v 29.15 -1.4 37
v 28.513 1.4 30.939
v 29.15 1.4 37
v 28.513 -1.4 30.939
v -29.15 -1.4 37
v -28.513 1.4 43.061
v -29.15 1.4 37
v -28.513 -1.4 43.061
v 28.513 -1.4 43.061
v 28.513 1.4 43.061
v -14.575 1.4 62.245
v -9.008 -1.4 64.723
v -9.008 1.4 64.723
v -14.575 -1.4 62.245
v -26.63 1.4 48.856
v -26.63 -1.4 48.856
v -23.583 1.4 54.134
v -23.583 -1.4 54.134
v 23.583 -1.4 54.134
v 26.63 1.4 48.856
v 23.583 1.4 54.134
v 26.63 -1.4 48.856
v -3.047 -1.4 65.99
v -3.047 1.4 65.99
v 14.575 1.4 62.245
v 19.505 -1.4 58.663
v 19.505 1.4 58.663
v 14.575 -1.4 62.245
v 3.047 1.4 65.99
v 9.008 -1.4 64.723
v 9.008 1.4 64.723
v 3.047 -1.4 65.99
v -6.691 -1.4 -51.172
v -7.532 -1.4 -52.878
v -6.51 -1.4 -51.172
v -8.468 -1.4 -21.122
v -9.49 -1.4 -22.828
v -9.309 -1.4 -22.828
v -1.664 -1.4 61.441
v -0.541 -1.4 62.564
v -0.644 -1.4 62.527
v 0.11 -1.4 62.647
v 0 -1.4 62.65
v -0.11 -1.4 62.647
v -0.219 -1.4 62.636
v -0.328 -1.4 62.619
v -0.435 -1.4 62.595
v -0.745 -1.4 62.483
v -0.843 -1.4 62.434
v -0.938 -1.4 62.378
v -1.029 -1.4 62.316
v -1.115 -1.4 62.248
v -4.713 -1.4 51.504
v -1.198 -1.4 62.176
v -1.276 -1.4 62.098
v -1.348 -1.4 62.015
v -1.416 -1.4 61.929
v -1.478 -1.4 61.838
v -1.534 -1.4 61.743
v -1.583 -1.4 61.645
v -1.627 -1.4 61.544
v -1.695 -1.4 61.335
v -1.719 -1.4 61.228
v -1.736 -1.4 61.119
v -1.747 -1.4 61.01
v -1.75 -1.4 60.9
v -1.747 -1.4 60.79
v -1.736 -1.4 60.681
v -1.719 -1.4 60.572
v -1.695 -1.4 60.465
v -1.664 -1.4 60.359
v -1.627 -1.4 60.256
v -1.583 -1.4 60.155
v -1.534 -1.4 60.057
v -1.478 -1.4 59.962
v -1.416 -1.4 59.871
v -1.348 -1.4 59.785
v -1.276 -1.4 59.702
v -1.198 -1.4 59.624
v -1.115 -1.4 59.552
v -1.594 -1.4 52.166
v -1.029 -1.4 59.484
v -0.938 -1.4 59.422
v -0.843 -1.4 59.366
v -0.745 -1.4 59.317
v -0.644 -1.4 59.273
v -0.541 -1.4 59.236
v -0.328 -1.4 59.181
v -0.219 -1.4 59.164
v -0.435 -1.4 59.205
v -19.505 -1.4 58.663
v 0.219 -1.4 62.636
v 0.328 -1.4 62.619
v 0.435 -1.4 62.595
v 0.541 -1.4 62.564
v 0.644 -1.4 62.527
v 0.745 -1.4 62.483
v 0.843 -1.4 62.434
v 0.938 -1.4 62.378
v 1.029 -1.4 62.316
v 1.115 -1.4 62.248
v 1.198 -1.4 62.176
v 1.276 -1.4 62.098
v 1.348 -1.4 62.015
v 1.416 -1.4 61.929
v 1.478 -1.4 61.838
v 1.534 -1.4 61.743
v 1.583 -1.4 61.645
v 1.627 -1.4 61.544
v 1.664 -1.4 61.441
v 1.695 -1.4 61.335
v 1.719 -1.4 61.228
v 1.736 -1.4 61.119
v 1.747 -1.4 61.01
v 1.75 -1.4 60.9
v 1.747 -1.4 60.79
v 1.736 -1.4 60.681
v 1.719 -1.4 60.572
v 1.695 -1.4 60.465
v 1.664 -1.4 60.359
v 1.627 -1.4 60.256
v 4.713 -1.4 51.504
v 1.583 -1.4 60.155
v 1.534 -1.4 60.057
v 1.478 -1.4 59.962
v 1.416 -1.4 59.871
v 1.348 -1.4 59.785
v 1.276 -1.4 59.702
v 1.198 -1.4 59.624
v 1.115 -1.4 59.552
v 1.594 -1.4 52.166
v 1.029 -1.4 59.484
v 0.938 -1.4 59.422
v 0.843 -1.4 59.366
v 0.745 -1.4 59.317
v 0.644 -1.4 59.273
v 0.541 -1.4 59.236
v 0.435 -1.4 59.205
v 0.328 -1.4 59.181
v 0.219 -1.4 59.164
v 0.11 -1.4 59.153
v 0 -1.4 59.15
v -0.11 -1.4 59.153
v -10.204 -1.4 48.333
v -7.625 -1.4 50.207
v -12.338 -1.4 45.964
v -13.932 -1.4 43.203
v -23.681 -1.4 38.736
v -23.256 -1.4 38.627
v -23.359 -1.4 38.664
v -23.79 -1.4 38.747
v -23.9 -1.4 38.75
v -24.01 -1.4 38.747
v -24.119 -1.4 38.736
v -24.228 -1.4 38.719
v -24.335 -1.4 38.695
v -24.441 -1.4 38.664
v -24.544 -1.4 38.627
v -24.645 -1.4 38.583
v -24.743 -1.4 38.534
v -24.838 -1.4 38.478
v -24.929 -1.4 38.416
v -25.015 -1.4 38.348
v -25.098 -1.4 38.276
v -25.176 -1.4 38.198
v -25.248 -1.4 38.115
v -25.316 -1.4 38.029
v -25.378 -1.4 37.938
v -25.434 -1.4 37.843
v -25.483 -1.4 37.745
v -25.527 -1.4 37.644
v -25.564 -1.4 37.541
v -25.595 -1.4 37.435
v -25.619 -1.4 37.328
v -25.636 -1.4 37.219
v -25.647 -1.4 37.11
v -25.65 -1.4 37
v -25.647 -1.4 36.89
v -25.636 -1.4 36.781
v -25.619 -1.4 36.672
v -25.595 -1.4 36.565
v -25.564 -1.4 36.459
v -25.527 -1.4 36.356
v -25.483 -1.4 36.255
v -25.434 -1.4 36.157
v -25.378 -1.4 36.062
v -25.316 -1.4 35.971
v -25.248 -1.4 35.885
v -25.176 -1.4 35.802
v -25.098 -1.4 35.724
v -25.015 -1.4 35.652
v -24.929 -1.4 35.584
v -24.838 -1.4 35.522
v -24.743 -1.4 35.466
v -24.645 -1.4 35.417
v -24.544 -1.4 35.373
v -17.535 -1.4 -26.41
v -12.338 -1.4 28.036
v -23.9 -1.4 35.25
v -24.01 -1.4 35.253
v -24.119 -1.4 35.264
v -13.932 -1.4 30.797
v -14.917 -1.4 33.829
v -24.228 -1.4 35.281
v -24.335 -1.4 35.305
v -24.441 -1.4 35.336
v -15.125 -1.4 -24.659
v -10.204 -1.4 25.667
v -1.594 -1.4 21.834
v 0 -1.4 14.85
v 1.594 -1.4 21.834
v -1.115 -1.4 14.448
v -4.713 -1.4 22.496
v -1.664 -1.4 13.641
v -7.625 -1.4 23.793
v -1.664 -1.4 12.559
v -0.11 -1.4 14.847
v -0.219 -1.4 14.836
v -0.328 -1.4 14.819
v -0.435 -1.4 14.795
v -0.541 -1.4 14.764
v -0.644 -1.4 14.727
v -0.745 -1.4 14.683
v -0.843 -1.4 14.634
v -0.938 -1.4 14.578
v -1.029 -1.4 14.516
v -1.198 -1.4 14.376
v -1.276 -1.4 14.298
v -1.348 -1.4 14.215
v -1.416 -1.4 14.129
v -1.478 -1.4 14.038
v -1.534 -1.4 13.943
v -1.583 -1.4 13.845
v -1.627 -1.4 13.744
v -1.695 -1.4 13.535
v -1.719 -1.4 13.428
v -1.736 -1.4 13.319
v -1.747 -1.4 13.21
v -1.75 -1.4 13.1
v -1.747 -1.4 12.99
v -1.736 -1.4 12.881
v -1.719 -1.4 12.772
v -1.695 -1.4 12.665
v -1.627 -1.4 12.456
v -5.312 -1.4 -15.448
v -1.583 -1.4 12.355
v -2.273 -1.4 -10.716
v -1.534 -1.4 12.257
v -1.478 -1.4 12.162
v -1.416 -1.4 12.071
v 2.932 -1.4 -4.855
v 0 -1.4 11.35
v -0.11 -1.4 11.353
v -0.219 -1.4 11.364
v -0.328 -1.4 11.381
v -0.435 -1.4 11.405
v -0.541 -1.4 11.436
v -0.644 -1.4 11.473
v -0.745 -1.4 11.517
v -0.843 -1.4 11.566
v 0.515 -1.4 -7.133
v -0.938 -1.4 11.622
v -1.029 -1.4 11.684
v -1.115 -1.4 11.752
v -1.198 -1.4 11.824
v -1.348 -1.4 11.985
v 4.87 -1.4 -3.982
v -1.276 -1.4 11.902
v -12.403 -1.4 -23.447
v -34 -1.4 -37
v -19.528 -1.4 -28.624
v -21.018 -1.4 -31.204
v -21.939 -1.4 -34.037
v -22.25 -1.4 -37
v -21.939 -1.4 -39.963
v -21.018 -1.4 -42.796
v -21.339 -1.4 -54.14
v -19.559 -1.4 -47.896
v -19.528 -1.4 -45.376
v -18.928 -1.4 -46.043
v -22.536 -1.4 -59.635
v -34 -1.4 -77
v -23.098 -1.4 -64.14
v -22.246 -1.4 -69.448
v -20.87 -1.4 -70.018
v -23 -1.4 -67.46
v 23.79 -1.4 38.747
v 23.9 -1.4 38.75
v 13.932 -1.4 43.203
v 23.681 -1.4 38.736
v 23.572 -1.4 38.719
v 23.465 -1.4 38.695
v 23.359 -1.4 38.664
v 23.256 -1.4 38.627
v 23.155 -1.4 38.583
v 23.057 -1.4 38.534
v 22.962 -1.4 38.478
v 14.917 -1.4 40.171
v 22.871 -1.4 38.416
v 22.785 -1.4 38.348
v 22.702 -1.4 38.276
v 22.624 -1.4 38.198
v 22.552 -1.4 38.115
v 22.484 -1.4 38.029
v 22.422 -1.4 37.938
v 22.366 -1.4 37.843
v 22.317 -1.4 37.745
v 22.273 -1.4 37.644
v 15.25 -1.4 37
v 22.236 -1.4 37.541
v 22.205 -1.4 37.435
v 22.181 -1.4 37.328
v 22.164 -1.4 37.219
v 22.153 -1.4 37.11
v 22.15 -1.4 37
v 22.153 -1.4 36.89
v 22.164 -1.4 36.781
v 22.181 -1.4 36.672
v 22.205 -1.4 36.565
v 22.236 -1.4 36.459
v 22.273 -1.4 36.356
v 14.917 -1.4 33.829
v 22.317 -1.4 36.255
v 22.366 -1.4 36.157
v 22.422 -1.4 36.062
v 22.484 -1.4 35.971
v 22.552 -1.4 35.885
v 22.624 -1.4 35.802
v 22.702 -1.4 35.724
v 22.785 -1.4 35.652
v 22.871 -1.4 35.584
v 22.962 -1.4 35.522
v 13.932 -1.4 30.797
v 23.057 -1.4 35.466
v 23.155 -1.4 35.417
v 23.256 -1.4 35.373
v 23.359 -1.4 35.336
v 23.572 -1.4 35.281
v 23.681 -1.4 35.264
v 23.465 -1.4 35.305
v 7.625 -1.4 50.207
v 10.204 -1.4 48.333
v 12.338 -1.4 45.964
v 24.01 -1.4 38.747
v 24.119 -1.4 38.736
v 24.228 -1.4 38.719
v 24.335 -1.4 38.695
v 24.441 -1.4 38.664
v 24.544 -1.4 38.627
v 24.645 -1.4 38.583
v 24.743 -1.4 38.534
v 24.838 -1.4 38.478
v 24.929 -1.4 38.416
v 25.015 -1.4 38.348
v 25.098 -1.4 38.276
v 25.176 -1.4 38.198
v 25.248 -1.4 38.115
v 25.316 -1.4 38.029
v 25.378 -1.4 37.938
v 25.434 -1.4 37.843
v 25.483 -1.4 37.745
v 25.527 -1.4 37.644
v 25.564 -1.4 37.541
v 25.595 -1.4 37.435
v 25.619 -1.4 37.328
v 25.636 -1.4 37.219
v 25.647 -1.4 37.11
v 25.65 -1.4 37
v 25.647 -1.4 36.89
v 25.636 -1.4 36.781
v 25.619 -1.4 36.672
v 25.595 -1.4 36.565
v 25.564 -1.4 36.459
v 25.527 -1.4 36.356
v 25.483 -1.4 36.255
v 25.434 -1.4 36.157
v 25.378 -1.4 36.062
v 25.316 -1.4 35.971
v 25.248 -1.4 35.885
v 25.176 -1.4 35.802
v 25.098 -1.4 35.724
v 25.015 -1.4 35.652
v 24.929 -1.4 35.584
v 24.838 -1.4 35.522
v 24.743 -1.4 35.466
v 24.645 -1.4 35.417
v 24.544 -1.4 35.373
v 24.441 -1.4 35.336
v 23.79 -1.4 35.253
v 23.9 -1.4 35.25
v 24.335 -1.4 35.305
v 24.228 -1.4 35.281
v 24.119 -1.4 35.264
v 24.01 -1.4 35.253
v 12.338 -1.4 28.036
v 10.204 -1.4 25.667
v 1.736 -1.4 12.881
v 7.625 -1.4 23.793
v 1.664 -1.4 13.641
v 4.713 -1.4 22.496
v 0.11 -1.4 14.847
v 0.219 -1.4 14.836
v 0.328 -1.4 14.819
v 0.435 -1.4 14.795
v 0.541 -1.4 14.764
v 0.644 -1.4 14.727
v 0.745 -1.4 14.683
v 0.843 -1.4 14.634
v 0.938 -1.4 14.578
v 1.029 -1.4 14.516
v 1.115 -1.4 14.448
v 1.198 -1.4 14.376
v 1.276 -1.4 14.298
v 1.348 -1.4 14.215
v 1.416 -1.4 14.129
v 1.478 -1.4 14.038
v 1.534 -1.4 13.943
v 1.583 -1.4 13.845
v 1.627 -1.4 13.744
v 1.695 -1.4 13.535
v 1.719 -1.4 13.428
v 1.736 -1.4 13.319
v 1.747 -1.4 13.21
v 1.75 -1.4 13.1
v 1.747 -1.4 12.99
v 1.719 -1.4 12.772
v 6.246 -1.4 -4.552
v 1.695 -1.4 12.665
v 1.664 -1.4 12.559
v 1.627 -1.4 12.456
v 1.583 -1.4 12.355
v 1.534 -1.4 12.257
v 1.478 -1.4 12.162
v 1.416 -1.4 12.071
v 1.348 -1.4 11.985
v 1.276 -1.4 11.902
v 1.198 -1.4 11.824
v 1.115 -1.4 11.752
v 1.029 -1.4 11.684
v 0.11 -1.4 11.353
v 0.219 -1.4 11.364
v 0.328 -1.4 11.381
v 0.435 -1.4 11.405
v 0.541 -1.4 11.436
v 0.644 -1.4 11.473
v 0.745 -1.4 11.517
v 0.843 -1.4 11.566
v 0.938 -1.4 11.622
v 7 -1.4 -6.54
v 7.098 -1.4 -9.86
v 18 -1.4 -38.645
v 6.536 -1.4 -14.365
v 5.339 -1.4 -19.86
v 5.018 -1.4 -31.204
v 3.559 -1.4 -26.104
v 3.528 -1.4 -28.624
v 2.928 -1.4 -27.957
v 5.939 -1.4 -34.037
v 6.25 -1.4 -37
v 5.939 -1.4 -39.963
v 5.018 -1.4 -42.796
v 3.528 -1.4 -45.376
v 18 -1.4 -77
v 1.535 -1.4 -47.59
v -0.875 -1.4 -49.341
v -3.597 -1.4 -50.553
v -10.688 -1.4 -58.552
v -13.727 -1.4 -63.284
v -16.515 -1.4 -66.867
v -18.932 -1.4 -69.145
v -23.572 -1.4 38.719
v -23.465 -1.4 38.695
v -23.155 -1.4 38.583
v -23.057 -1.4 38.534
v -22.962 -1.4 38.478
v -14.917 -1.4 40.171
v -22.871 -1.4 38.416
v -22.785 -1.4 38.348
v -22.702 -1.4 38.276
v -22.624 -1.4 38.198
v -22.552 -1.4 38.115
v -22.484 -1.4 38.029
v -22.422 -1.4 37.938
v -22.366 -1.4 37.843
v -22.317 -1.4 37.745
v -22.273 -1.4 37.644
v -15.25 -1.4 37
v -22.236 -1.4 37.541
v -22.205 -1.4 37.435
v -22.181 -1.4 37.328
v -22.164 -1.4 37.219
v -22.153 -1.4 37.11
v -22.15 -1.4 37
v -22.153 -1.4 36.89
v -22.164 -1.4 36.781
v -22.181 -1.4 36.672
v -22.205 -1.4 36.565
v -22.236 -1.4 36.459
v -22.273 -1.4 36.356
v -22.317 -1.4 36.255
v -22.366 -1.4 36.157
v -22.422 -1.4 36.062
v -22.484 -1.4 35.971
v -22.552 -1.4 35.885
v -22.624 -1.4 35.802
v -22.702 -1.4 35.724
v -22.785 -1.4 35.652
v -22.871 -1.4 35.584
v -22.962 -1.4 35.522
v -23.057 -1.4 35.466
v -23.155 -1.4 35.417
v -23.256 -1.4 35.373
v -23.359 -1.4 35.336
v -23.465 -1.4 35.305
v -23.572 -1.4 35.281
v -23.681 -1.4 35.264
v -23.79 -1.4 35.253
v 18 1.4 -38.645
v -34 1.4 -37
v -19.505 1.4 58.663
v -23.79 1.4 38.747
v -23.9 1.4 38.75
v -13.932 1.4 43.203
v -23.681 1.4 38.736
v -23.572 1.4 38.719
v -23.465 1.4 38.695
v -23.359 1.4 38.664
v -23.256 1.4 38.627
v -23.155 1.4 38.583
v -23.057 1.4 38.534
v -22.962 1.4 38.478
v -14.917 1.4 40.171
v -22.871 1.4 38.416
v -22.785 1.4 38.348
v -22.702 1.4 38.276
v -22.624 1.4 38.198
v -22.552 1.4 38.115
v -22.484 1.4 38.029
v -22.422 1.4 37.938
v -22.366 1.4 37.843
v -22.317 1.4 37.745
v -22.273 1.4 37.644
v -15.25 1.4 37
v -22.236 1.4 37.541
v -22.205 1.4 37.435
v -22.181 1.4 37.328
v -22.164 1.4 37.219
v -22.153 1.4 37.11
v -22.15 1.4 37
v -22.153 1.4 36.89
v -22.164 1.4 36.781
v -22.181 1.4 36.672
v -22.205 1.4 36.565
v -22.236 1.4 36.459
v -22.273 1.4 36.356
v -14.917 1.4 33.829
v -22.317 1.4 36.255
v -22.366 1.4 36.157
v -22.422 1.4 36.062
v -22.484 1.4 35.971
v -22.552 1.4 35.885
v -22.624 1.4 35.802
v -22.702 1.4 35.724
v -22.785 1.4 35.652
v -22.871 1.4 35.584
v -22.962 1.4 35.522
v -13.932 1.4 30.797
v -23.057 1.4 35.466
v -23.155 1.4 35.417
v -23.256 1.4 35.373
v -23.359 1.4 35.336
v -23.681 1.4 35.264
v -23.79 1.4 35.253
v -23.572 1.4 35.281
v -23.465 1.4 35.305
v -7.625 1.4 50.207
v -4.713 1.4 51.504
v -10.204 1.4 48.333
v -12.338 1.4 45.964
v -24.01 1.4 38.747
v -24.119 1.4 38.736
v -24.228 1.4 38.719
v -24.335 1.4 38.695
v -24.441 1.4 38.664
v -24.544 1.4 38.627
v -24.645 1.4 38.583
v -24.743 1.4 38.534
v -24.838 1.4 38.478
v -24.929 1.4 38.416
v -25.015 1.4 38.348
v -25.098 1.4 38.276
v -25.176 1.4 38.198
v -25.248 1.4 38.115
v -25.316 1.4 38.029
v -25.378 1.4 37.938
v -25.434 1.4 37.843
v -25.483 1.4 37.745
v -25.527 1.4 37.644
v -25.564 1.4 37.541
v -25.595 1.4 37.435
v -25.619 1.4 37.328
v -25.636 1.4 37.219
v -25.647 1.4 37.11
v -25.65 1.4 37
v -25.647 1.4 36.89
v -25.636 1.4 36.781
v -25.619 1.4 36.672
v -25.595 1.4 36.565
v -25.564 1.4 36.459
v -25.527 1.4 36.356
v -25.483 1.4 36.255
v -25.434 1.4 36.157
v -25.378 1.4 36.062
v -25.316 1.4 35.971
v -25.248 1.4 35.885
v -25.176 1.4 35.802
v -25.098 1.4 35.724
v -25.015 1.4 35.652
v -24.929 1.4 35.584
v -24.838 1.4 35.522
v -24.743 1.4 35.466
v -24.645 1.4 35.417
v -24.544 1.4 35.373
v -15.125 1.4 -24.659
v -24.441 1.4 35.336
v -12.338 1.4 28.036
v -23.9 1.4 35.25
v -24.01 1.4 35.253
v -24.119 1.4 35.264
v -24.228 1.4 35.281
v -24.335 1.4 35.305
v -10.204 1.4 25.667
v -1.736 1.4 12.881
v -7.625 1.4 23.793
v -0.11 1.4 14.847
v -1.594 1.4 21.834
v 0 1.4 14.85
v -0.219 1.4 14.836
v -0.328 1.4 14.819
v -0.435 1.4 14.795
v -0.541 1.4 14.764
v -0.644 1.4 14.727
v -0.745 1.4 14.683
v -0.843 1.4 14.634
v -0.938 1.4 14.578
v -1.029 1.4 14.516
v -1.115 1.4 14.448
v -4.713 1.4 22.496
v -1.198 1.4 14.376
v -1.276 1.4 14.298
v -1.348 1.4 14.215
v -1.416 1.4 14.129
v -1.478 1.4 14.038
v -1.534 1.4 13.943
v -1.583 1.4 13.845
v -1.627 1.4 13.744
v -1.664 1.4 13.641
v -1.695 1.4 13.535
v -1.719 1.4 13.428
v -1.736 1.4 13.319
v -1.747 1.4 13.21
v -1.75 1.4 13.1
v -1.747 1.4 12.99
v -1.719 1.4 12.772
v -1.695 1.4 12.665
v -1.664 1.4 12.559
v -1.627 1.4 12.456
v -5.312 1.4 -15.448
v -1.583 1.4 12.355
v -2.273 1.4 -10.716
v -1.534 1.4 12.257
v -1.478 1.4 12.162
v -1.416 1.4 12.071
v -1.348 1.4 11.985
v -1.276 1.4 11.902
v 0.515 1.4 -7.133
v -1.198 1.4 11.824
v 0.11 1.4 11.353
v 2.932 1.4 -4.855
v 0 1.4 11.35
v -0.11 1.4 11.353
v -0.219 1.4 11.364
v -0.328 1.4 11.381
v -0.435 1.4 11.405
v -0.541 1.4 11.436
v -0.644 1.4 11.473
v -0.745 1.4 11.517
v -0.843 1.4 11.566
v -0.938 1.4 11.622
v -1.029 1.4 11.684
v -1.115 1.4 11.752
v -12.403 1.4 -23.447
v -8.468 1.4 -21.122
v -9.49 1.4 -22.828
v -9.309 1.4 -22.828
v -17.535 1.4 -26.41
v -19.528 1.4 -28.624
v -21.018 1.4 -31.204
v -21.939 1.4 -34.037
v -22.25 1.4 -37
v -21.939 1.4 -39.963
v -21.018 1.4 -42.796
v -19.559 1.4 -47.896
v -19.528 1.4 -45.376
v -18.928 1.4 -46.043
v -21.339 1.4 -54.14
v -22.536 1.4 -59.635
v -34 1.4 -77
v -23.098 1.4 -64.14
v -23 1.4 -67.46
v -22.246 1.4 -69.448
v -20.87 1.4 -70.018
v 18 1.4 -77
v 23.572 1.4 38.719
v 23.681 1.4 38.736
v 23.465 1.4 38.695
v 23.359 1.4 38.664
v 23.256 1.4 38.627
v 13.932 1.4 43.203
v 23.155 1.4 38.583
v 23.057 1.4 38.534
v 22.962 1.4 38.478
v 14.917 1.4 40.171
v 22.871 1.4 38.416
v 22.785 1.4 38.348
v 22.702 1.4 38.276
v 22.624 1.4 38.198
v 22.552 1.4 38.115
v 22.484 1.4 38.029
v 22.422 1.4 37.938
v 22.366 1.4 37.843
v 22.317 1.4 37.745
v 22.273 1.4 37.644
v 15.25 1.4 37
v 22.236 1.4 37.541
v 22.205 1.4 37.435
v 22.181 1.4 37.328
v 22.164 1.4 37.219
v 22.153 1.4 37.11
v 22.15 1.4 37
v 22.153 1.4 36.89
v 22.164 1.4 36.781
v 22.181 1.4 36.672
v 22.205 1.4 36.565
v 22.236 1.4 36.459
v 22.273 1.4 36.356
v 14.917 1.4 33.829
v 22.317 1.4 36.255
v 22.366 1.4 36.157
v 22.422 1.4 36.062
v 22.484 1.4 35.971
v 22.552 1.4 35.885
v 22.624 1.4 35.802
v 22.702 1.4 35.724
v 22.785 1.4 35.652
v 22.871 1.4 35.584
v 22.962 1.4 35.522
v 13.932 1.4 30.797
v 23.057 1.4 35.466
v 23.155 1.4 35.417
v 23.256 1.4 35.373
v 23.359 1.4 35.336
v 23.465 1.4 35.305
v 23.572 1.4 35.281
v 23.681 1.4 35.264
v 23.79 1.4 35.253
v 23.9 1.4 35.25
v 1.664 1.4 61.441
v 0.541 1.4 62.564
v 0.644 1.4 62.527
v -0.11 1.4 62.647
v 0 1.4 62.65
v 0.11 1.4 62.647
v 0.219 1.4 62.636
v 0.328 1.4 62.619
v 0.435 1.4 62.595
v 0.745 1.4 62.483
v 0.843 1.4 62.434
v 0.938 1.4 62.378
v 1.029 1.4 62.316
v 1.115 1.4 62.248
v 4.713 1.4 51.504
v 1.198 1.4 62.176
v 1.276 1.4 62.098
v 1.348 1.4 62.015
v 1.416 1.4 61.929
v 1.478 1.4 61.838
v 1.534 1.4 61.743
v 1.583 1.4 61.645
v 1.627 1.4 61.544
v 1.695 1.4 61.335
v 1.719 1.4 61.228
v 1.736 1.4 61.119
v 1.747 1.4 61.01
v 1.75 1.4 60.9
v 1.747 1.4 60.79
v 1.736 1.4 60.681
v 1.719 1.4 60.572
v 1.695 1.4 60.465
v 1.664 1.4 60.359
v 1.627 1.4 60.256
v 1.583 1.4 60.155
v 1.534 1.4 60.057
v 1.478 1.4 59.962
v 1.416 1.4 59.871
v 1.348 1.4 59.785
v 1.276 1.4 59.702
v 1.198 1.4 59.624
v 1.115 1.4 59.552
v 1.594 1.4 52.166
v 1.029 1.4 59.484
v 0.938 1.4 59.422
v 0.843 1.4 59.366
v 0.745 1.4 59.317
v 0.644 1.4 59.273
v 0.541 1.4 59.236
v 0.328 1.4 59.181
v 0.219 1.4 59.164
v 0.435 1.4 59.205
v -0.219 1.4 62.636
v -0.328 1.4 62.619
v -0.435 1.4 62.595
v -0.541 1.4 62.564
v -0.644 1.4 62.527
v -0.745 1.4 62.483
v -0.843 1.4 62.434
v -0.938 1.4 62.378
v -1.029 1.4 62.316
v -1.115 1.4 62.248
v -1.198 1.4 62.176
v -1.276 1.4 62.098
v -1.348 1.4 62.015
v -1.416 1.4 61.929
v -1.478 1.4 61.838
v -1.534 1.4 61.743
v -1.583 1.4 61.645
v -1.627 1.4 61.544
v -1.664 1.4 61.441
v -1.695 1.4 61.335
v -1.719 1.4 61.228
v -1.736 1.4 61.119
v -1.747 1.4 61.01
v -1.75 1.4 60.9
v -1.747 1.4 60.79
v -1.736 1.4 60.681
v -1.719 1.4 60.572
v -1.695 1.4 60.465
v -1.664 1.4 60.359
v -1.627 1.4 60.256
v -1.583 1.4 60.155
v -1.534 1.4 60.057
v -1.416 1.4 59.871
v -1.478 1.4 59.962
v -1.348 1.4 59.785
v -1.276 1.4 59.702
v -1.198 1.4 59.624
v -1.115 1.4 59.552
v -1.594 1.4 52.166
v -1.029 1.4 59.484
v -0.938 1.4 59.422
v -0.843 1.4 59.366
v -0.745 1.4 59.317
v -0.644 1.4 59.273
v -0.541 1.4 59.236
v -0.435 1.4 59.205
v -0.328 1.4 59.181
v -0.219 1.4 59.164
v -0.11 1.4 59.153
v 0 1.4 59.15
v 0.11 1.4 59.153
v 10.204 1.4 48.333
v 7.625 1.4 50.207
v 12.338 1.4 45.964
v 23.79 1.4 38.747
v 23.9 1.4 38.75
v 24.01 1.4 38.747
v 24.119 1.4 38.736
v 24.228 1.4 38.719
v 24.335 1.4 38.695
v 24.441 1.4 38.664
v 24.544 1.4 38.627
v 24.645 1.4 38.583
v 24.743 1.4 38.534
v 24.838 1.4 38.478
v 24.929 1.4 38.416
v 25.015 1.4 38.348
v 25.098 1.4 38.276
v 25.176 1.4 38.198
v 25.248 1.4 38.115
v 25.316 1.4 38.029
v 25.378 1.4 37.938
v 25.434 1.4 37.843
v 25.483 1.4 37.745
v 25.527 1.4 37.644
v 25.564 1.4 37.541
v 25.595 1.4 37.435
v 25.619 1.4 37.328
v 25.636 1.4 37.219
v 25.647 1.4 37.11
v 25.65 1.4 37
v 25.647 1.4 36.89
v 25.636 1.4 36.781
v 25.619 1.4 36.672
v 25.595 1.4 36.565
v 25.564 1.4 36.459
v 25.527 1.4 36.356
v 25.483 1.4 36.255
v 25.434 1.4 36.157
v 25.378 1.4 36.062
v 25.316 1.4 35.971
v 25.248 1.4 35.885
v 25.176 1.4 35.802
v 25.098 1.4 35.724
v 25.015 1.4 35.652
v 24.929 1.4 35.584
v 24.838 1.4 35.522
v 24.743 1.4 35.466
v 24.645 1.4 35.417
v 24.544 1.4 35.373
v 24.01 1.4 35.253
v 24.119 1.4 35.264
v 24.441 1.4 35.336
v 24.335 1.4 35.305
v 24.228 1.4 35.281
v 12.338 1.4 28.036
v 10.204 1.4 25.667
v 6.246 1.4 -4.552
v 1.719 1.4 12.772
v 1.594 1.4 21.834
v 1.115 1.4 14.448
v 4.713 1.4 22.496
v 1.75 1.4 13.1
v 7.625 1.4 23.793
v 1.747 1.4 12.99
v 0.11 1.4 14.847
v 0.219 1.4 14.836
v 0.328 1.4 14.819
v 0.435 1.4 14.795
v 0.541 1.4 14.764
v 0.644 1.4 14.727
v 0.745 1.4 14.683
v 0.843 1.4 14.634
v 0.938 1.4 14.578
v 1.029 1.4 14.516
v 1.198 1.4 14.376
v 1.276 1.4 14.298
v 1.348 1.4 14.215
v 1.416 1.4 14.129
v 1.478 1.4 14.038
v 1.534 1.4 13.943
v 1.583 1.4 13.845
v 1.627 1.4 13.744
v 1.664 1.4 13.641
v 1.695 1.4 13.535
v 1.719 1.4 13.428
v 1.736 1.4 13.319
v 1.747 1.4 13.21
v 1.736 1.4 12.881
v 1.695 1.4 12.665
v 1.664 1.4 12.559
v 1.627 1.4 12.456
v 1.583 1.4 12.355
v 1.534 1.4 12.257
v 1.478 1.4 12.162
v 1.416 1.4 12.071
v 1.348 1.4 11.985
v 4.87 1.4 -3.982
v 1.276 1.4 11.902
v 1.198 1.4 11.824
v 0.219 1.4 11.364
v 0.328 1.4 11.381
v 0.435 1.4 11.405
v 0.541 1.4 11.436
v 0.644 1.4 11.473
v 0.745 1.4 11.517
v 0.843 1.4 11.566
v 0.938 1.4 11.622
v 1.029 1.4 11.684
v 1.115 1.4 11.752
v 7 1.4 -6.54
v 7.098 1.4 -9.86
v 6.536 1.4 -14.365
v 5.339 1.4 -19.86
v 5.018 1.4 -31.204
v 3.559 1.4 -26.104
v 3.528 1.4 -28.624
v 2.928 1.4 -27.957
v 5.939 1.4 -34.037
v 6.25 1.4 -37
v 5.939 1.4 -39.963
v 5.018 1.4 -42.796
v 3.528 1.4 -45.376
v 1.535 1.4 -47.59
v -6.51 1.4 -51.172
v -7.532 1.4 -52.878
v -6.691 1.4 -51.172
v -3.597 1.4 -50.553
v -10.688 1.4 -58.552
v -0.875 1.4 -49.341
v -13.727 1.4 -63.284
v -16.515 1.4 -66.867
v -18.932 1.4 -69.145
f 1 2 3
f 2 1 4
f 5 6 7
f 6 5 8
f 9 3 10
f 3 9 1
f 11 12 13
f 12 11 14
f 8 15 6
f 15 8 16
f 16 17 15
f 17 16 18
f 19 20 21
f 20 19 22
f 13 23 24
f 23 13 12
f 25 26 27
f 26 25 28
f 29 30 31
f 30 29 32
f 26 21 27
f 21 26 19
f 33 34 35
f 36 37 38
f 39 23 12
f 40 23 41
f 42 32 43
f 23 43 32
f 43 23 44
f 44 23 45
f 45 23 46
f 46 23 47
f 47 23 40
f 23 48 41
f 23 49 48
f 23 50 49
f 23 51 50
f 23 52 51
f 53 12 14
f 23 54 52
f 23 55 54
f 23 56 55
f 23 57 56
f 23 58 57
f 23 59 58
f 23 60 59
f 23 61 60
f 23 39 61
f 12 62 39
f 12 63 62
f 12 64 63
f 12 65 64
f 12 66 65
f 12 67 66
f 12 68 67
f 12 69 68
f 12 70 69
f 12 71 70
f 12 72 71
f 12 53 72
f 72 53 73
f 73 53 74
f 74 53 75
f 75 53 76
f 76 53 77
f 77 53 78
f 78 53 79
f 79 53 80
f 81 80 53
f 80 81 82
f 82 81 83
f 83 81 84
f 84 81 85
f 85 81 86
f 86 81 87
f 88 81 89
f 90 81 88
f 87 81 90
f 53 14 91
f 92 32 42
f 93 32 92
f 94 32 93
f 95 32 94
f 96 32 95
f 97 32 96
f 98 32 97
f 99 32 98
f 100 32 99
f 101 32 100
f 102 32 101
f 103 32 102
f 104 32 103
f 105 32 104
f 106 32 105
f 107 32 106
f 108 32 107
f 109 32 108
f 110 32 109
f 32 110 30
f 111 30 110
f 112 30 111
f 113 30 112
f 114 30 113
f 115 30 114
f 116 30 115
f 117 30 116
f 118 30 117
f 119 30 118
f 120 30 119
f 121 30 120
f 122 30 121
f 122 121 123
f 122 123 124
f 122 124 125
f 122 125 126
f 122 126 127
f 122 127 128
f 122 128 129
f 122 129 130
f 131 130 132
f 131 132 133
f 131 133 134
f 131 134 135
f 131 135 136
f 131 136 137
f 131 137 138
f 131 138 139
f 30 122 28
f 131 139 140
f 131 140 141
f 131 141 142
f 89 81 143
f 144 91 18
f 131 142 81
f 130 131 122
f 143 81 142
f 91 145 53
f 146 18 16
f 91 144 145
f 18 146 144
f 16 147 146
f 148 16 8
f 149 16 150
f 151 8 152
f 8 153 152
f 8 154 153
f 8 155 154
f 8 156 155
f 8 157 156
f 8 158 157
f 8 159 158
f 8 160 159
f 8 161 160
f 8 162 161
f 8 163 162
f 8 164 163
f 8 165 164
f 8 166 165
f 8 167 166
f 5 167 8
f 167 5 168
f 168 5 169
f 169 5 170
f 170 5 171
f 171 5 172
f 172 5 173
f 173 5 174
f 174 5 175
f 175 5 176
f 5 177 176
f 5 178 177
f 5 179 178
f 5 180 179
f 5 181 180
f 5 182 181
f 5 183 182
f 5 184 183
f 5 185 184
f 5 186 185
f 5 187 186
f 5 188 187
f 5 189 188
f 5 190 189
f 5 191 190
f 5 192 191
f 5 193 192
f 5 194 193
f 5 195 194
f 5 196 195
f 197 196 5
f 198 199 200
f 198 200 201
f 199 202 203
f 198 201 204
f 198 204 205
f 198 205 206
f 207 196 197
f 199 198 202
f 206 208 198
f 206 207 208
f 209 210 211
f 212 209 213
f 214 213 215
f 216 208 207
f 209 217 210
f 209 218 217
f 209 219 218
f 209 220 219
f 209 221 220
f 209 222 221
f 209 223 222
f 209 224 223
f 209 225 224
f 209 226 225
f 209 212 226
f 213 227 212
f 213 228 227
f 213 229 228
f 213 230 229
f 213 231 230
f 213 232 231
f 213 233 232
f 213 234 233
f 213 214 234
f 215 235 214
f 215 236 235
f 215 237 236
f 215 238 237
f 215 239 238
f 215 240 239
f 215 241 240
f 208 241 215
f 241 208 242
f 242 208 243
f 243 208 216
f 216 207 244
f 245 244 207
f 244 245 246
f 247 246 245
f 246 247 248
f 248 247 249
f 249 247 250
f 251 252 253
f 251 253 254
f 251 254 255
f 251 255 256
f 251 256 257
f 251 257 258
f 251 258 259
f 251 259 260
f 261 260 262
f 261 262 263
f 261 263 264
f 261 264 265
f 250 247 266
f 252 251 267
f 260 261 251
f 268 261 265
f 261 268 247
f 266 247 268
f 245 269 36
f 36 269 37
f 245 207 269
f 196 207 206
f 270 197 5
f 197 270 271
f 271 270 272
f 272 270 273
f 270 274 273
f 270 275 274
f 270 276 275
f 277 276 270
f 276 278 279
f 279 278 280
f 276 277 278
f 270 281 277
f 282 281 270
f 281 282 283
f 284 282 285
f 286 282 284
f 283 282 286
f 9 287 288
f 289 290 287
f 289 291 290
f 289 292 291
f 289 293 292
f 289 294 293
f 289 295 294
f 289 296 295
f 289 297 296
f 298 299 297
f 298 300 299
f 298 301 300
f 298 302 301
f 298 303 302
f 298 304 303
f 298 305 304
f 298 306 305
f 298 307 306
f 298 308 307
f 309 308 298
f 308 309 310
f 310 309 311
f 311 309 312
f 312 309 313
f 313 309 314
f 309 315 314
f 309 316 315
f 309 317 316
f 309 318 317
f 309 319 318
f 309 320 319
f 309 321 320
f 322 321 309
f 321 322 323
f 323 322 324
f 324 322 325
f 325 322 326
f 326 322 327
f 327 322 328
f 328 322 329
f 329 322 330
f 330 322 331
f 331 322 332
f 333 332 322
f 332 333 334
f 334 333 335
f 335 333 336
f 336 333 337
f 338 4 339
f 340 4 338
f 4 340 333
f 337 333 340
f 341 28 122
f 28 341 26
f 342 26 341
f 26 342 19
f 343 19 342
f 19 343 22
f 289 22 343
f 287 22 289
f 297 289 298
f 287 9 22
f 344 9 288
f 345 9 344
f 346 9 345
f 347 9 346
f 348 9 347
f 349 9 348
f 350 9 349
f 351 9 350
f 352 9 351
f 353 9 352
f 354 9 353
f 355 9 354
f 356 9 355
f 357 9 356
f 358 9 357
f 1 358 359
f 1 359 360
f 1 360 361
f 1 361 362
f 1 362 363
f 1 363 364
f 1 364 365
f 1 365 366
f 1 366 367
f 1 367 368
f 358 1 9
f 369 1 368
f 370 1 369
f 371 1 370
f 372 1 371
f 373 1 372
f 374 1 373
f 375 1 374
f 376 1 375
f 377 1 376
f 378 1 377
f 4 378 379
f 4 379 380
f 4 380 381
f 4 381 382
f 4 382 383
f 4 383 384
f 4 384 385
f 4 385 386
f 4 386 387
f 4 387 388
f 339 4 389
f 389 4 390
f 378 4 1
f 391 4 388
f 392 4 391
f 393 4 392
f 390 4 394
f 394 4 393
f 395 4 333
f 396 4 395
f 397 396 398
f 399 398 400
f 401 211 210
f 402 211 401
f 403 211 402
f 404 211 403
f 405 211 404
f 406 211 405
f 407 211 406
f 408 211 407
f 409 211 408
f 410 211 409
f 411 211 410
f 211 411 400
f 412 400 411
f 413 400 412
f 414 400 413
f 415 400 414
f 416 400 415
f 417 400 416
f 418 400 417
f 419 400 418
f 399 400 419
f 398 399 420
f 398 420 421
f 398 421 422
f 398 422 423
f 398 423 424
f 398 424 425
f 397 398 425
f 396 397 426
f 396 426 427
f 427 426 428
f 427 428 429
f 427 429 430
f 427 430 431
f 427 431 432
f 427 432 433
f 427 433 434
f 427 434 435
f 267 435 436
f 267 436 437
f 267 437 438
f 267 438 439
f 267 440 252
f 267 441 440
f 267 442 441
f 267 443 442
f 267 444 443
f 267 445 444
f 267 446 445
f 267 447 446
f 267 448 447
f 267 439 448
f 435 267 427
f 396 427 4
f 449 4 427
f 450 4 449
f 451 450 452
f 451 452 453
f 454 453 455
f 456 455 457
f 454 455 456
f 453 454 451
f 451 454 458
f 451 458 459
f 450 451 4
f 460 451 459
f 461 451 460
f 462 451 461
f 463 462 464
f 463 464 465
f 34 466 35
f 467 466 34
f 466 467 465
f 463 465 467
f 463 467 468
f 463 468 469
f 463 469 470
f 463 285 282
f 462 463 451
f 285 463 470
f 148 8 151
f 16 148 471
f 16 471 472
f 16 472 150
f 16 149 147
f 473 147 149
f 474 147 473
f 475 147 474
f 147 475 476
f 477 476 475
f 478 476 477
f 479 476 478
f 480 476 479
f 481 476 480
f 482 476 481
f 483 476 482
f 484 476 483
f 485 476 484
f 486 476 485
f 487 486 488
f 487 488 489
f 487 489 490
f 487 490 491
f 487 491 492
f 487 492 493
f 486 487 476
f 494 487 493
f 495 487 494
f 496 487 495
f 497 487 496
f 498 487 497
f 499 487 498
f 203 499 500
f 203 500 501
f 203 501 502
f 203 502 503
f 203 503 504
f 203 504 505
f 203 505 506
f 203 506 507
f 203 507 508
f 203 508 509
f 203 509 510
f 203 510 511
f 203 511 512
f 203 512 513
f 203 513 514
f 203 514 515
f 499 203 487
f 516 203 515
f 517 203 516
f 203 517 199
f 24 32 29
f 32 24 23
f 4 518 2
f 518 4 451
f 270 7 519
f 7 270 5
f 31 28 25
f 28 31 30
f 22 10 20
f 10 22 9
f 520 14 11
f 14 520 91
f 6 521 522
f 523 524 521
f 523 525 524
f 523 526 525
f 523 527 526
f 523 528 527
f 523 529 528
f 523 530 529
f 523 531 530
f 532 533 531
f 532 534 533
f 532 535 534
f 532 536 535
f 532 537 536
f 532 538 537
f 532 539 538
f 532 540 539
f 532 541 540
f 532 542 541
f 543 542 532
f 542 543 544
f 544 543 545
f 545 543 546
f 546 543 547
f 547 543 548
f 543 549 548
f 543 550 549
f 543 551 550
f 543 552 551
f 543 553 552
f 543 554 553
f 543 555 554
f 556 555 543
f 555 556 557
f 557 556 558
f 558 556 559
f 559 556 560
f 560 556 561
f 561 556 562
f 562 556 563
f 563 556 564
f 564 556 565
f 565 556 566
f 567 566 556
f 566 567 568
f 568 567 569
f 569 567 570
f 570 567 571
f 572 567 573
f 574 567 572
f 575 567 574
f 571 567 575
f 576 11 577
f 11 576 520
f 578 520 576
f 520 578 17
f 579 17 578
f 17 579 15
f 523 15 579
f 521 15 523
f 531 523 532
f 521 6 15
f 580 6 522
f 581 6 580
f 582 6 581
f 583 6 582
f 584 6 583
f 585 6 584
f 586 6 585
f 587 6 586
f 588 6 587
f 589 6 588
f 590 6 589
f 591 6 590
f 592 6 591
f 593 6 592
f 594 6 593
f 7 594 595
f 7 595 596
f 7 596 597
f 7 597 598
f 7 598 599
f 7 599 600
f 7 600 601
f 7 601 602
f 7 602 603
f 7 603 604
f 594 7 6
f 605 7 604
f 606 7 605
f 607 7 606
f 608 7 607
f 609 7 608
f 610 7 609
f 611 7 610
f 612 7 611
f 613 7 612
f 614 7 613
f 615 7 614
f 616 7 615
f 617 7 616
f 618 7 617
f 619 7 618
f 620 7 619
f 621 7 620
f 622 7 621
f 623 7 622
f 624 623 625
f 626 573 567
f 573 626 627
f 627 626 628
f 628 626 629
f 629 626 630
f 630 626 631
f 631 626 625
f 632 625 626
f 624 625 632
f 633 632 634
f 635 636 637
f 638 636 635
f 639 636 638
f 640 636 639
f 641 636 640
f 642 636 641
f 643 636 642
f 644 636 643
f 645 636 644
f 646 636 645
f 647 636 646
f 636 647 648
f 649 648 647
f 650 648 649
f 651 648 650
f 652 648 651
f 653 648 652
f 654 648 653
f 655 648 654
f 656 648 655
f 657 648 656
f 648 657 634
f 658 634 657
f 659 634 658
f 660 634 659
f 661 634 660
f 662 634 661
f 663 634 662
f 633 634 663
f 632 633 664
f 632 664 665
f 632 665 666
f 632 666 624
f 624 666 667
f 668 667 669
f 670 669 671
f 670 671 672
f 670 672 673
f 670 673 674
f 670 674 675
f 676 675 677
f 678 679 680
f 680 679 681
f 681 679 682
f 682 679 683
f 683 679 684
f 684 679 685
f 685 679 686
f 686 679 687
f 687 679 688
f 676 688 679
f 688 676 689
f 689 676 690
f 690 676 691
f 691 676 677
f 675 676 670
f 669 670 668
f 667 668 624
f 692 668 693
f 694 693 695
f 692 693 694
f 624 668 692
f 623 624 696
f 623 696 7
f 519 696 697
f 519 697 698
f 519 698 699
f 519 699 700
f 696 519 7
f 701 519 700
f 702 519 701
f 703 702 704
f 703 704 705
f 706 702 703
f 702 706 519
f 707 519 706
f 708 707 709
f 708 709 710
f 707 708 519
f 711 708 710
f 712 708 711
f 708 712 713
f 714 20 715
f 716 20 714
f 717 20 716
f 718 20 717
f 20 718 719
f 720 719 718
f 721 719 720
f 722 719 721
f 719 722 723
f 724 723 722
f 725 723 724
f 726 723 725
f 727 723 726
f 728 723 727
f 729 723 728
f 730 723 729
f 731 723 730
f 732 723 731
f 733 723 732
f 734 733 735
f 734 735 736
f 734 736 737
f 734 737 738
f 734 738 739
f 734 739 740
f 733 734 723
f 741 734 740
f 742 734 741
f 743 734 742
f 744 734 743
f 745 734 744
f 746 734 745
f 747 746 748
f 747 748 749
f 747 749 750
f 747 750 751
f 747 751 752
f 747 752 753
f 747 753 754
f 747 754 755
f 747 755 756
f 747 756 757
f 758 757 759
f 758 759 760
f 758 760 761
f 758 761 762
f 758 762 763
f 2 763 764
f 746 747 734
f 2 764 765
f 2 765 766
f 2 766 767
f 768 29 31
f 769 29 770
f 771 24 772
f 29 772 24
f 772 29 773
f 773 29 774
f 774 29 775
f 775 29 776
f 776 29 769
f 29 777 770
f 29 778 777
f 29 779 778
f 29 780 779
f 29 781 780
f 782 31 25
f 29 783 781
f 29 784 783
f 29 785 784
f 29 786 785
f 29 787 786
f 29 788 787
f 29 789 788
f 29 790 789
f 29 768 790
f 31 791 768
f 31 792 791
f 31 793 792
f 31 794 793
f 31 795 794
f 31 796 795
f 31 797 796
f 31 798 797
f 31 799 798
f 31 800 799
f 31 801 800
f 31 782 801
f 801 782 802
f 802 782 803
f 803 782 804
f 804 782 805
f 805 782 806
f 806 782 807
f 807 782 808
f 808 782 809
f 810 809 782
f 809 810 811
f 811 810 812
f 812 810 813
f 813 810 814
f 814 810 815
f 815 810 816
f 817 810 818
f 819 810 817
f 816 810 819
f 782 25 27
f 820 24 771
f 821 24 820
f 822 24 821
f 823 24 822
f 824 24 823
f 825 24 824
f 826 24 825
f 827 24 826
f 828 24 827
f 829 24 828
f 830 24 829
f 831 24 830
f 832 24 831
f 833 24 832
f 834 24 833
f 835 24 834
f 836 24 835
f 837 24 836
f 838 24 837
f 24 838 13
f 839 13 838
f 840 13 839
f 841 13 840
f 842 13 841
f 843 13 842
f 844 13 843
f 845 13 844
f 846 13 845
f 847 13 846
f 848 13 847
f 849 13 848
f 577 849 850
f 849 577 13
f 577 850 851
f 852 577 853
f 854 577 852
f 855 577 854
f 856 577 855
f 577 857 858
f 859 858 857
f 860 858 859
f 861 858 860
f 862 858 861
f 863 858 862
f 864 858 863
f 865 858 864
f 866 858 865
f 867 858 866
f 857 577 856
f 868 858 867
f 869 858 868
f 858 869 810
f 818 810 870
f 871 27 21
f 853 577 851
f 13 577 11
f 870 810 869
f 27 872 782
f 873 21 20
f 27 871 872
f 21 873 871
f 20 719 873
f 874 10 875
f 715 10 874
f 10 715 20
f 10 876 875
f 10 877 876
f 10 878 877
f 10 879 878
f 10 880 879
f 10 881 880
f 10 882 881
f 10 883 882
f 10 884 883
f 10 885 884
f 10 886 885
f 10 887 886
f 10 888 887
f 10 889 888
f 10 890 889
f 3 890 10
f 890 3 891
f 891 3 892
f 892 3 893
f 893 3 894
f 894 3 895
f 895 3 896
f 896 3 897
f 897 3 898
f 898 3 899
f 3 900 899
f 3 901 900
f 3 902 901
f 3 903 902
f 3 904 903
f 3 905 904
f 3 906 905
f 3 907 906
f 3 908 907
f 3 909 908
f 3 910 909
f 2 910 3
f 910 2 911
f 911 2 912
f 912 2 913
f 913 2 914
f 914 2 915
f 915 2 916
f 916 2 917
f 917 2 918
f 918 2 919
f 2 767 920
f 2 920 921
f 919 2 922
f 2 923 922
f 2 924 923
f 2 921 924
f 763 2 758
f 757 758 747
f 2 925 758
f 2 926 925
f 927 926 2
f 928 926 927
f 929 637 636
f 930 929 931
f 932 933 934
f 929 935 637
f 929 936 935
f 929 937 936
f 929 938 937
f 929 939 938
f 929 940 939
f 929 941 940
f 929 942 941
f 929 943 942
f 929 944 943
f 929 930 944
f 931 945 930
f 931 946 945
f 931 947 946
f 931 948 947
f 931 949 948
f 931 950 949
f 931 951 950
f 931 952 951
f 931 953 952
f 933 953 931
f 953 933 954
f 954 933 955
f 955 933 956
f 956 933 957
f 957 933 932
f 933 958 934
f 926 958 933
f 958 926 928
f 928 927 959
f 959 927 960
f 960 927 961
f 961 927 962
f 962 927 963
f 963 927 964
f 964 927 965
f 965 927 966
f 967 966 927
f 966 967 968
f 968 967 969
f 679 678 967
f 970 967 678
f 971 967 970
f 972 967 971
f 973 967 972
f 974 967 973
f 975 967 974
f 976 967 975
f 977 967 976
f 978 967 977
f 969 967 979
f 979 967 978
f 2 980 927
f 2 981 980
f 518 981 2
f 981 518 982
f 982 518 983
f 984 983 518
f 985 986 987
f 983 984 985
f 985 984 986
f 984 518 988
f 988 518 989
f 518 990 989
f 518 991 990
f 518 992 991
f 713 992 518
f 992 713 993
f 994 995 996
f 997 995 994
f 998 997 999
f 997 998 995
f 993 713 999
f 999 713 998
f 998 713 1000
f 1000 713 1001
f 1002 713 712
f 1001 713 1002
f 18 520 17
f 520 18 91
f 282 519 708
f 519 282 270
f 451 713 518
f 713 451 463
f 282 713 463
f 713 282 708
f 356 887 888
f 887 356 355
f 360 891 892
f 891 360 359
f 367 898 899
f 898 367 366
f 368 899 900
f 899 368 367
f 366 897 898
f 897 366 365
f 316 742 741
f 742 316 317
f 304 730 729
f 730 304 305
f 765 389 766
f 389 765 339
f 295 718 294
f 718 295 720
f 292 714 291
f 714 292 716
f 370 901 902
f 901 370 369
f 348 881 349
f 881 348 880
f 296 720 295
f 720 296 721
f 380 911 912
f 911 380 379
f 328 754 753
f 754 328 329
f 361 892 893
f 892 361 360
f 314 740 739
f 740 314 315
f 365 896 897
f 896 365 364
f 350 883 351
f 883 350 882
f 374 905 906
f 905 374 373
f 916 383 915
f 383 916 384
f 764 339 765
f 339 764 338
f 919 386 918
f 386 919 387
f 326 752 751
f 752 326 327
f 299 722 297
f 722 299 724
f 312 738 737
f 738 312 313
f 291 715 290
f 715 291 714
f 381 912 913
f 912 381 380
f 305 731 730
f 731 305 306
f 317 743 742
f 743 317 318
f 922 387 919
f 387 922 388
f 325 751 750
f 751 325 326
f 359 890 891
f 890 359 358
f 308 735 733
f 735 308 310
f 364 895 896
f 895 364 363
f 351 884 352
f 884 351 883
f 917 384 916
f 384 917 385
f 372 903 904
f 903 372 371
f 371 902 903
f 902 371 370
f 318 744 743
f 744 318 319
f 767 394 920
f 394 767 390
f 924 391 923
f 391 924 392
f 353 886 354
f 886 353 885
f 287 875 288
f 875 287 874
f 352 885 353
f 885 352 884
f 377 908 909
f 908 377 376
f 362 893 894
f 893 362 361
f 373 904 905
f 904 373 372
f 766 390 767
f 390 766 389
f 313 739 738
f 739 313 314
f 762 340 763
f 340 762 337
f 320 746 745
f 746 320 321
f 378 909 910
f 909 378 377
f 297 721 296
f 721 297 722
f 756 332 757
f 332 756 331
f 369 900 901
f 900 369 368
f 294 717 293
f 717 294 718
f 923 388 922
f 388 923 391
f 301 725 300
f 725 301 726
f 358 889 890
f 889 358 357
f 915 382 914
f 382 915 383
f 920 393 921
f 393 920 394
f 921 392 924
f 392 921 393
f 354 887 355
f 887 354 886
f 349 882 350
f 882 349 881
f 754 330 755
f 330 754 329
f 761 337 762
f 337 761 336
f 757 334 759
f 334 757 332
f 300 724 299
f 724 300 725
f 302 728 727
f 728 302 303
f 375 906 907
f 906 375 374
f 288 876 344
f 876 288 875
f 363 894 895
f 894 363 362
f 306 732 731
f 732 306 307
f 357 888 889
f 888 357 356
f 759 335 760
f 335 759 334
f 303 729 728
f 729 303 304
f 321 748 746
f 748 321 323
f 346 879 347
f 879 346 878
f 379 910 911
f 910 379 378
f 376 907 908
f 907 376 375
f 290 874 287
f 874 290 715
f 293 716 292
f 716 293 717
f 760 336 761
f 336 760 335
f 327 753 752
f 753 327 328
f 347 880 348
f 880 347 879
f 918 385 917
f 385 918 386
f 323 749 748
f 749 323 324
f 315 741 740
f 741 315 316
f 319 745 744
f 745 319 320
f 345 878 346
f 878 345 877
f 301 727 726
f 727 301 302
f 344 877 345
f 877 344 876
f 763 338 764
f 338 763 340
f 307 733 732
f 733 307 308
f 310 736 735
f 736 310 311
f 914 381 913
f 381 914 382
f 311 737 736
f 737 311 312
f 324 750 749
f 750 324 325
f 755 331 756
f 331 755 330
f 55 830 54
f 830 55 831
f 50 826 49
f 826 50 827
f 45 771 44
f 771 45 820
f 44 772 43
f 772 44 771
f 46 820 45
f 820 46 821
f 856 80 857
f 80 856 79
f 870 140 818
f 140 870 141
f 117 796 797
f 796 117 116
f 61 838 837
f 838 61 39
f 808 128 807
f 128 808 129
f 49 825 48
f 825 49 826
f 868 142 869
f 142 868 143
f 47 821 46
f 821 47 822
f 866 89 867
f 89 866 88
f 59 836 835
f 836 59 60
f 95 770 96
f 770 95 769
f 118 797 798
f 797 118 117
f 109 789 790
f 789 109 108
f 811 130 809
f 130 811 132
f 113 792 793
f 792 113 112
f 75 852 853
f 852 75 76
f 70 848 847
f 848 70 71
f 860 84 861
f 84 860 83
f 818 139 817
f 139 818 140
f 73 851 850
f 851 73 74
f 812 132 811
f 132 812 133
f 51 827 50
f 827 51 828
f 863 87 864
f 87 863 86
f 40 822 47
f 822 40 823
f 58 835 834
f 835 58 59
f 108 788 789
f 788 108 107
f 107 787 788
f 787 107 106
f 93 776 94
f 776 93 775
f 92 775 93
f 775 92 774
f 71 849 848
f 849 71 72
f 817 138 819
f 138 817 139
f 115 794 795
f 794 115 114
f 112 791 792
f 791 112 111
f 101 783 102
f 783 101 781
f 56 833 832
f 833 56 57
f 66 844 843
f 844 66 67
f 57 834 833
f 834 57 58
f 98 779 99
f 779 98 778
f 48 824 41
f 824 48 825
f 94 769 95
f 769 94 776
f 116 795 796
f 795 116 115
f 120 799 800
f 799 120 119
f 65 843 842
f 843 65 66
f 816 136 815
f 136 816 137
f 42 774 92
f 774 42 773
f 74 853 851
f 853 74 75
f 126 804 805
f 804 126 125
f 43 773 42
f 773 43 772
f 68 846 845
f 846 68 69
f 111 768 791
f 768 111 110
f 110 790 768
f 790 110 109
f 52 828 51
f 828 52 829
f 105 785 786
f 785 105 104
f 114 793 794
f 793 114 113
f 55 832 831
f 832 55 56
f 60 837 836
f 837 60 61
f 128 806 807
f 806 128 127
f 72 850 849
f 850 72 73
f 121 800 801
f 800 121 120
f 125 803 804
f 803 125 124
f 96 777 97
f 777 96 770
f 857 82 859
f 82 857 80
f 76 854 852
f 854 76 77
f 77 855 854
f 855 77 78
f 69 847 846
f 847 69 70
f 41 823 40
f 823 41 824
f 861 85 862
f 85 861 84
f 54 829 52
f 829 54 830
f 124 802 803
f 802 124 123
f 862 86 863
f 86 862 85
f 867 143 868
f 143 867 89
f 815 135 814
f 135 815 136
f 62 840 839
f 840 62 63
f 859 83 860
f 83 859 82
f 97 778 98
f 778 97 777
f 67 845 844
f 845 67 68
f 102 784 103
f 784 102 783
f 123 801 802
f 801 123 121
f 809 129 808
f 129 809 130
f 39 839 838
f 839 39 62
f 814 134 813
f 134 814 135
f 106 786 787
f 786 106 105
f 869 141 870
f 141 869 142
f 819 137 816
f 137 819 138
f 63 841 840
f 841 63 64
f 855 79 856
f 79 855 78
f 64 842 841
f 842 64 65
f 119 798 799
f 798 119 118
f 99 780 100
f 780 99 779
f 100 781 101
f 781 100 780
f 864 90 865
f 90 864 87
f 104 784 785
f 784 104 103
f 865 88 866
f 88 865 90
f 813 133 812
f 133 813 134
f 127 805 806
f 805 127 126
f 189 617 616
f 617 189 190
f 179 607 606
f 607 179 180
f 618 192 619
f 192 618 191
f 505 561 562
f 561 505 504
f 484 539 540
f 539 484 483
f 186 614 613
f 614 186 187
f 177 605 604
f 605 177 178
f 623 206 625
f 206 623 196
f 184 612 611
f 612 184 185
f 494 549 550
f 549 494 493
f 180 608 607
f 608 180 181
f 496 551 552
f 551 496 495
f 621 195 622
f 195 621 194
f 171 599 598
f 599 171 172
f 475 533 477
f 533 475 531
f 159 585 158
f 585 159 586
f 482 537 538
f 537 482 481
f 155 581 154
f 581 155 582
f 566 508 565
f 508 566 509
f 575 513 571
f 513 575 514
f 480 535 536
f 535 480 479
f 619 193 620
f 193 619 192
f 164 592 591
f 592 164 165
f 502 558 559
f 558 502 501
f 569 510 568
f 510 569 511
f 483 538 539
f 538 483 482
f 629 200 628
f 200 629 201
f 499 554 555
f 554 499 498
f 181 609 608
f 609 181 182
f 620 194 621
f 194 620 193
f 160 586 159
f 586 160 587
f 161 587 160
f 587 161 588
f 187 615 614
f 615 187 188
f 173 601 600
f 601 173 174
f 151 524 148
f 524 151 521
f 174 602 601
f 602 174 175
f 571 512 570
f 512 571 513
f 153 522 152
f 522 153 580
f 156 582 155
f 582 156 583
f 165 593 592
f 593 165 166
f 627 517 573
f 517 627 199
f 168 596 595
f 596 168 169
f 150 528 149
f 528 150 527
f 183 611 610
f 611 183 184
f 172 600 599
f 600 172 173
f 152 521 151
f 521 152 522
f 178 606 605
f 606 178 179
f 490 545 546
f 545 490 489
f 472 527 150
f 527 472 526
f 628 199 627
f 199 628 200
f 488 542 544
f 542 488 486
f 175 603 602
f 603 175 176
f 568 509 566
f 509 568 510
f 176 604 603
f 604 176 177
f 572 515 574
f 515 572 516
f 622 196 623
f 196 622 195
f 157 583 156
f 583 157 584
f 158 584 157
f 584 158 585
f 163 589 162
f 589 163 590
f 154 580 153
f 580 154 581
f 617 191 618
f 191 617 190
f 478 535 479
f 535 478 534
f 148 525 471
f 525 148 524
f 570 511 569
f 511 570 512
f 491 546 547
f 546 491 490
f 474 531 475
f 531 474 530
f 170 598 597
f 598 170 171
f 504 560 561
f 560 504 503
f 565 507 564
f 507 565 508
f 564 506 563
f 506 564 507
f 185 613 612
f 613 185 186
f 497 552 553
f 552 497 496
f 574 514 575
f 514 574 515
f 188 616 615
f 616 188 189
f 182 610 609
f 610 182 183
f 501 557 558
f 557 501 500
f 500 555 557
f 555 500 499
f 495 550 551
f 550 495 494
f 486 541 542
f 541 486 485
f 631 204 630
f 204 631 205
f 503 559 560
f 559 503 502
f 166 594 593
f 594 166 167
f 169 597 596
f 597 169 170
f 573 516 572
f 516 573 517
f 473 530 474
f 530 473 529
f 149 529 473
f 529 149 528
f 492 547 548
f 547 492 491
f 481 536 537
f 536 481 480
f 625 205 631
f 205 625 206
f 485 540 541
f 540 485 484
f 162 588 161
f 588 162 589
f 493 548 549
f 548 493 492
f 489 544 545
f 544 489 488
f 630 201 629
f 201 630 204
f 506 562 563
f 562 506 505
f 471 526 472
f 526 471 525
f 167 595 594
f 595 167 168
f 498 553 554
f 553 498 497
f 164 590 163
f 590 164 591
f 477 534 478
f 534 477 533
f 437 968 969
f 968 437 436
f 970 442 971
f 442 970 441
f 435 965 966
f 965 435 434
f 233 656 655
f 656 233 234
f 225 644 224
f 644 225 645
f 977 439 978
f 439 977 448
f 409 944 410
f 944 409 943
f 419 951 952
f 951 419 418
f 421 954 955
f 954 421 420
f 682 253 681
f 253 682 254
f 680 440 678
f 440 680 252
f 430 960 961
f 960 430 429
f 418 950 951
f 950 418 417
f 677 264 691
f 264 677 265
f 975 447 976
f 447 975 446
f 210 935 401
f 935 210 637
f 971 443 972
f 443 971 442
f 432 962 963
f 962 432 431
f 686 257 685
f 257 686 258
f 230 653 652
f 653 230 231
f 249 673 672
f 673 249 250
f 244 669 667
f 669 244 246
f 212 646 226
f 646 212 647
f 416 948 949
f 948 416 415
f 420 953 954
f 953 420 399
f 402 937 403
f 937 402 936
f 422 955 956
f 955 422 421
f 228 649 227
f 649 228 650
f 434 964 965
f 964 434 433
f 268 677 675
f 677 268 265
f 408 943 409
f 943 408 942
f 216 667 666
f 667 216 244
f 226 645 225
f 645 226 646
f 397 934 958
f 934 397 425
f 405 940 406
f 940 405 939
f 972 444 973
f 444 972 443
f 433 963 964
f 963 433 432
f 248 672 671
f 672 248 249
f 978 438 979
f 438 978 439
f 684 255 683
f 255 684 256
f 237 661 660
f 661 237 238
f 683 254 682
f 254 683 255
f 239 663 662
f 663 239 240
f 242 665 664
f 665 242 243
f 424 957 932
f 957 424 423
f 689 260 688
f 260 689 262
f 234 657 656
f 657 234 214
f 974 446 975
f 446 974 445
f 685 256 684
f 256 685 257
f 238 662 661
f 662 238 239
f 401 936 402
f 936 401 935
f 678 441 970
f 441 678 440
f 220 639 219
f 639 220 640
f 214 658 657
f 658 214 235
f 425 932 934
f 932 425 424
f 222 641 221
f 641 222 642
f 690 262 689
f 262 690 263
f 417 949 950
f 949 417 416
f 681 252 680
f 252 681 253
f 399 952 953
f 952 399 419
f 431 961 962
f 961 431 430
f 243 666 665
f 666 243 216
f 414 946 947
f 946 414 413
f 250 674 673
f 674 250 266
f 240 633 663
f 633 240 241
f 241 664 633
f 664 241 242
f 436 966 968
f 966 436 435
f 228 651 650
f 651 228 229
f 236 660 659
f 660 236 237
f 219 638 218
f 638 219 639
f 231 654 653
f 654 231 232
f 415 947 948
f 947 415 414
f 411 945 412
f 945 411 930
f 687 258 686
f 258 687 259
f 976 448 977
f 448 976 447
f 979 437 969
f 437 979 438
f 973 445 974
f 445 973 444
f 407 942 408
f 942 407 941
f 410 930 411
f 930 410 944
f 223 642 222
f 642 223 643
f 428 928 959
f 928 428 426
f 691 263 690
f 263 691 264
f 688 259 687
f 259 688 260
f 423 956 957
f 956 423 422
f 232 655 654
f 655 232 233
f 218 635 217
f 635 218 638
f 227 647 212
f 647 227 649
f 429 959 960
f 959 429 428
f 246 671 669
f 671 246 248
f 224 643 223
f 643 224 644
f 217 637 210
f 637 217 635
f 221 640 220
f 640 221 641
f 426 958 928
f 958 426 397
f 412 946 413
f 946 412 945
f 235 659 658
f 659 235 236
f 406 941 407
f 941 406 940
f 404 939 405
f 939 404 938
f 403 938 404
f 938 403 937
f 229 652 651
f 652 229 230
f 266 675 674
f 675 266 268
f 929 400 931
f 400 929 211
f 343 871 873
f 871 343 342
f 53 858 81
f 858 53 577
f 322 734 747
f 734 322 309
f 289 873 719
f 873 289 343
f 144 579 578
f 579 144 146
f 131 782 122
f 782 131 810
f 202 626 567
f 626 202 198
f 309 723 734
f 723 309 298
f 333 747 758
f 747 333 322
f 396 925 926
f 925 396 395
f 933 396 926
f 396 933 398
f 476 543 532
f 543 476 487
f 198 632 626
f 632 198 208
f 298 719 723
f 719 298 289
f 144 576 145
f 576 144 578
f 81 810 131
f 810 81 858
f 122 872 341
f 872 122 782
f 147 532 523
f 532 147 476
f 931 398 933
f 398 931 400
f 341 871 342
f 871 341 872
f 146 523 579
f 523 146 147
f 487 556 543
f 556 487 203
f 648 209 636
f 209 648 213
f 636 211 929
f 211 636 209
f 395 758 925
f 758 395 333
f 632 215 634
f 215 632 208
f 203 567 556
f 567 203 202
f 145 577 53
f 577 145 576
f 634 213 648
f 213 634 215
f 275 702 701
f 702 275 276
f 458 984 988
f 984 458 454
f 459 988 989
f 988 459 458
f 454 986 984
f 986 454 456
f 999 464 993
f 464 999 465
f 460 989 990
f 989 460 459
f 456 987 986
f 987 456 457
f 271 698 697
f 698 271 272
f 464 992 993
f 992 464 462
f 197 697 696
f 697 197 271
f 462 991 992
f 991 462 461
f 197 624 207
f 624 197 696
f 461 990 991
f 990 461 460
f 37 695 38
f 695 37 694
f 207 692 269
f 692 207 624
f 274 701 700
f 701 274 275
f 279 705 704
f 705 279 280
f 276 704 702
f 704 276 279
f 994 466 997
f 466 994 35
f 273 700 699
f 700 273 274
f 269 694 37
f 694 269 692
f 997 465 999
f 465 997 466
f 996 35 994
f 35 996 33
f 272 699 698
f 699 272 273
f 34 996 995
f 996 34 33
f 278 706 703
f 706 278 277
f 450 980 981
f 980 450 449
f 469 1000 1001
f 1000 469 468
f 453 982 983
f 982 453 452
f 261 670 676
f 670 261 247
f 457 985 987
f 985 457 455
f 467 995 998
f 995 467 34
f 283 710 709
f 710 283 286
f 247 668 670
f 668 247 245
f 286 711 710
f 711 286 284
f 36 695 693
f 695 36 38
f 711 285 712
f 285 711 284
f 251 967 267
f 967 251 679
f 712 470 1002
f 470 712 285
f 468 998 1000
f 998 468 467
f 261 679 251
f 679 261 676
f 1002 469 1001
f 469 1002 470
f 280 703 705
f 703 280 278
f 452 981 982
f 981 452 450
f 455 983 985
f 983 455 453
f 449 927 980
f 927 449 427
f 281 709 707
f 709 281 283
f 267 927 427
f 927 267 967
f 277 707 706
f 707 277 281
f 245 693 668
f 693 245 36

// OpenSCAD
thickness = 2.8;

motor_diameter = 30;
motor_diameter_allowance = 0.5;
motor_holes_center_to_center = 47.8;
motor_holes_diameter = 3.5;

turbidity_diameter = 28;
turdibidity_diameter_allowance = 0.5;
turbidity_edge_width = 12;

separation_center_to_center = 74;
offset_center_to_center = 8;

difference() {

  // base plate
  union() {
    hull() {

      motor_loc()
        cylinder(d=motor_holes_center_to_center + motor_holes_diameter * 3, h=thickness, center=true);
      turbidity_loc()
        union() {
          cylinder(d=turbidity_diameter + turbidity_edge_width * 2, h=thickness, center=true);
        }
    }
    turbidity_loc()

      translate([0, -(turbidity_diameter + turbidity_edge_width) / 2, 0])
        cube([turbidity_diameter + turbidity_edge_width * 2, (turbidity_diameter + turbidity_edge_width), thickness], center=true);
  }

  // motor cuts
  motor_loc()
    color("grey")
      union() {
        cylinder(d=motor_diameter + motor_diameter_allowance, h=thickness * 1.1, center=true);
        for (i = [0:3]) {
          rotate([0, 0, i * 90])
            translate([motor_holes_center_to_center / 2, 0, 0])
              cylinder(d=motor_holes_diameter, h=thickness + 1, center=true, $fn=100);
        }
      }

  // turbidity sensor cuts
  turbidity_loc()
    color("green")
      union() {
        cylinder(d=turbidity_diameter + turdibidity_diameter_allowance, h=thickness * 1.1, center=true);
        rotate([0, 0, -90 / 4]) scale([1 / 2, 2.5, 1]) cylinder(d=turbidity_diameter + turdibidity_diameter_allowance, h=thickness * 1.1, center=true);
      }
}
module motor_loc() {
  translate([0, 0, separation_center_to_center / 2])
    rotate([90, 0, 0])
      children();
}
module turbidity_loc() {
  translate([-offset_center_to_center, 0, -separation_center_to_center / 2])
    rotate([90, 0, 0])
      children();
}
